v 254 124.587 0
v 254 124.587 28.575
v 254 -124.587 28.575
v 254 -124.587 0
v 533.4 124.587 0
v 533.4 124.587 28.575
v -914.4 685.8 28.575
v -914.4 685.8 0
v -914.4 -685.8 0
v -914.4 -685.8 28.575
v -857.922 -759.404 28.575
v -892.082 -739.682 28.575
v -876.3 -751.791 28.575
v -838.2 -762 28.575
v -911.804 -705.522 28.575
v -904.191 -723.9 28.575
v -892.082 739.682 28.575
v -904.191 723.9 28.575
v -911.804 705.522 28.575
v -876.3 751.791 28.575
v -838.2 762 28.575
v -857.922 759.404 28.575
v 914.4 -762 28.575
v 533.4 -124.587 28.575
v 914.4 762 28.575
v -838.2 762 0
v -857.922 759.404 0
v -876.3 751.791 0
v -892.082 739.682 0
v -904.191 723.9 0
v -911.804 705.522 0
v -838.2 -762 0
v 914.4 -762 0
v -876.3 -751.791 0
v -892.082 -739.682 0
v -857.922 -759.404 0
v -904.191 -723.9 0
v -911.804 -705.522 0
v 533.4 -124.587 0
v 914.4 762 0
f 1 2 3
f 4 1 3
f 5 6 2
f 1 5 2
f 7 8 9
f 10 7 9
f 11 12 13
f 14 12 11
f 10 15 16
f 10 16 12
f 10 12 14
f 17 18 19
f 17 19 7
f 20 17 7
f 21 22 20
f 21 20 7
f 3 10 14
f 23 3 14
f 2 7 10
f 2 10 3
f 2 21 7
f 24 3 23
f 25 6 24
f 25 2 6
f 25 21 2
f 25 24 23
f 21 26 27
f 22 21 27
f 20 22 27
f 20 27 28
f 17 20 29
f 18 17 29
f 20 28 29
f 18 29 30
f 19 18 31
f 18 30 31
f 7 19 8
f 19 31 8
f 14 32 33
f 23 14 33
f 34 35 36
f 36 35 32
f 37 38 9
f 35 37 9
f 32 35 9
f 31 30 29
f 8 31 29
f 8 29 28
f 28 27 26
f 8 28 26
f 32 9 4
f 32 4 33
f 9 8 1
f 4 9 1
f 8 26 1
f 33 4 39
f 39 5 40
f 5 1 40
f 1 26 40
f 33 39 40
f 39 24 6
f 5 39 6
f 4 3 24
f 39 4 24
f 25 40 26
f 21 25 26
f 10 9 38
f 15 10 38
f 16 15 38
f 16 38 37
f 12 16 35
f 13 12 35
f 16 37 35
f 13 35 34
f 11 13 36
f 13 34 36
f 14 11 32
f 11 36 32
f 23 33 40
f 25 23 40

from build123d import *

# Parameters (mm, degrees)
F1_DEPTH = 28.575
F3_DEPTH = 28.575


with BuildPart() as f1:
    # F0 (on Top) → F1 (new body)
    with BuildSketch(Plane.XY):
        with BuildLine():
            Line((914.4, -762), (914.4, 762))
            Line((914.4, 762), (-838.2, 762))
            ThreePointArc((-838.2, 762), (-892.081537, 739.681537), (-914.4, 685.8))
            Line((-914.4, 685.8), (-914.4, -685.8))
            ThreePointArc((-914.4, -685.8), (-892.081537, -739.681537), (-838.2, -762))
            Line((-838.2, -762), (914.4, -762))
        make_face()
    extrude(amount=F1_DEPTH)

    # F2 (on face) → F3 (cut)
    with BuildSketch(Plane.XY.offset(28.575)):
        Polygon((533.4, -124.587), (533.4, 0), (533.4, 124.587), (254, 124.587), (254, -124.587), align=None)
    extrude(amount=-F3_DEPTH, mode=Mode.SUBTRACT)


solid = f1.part
